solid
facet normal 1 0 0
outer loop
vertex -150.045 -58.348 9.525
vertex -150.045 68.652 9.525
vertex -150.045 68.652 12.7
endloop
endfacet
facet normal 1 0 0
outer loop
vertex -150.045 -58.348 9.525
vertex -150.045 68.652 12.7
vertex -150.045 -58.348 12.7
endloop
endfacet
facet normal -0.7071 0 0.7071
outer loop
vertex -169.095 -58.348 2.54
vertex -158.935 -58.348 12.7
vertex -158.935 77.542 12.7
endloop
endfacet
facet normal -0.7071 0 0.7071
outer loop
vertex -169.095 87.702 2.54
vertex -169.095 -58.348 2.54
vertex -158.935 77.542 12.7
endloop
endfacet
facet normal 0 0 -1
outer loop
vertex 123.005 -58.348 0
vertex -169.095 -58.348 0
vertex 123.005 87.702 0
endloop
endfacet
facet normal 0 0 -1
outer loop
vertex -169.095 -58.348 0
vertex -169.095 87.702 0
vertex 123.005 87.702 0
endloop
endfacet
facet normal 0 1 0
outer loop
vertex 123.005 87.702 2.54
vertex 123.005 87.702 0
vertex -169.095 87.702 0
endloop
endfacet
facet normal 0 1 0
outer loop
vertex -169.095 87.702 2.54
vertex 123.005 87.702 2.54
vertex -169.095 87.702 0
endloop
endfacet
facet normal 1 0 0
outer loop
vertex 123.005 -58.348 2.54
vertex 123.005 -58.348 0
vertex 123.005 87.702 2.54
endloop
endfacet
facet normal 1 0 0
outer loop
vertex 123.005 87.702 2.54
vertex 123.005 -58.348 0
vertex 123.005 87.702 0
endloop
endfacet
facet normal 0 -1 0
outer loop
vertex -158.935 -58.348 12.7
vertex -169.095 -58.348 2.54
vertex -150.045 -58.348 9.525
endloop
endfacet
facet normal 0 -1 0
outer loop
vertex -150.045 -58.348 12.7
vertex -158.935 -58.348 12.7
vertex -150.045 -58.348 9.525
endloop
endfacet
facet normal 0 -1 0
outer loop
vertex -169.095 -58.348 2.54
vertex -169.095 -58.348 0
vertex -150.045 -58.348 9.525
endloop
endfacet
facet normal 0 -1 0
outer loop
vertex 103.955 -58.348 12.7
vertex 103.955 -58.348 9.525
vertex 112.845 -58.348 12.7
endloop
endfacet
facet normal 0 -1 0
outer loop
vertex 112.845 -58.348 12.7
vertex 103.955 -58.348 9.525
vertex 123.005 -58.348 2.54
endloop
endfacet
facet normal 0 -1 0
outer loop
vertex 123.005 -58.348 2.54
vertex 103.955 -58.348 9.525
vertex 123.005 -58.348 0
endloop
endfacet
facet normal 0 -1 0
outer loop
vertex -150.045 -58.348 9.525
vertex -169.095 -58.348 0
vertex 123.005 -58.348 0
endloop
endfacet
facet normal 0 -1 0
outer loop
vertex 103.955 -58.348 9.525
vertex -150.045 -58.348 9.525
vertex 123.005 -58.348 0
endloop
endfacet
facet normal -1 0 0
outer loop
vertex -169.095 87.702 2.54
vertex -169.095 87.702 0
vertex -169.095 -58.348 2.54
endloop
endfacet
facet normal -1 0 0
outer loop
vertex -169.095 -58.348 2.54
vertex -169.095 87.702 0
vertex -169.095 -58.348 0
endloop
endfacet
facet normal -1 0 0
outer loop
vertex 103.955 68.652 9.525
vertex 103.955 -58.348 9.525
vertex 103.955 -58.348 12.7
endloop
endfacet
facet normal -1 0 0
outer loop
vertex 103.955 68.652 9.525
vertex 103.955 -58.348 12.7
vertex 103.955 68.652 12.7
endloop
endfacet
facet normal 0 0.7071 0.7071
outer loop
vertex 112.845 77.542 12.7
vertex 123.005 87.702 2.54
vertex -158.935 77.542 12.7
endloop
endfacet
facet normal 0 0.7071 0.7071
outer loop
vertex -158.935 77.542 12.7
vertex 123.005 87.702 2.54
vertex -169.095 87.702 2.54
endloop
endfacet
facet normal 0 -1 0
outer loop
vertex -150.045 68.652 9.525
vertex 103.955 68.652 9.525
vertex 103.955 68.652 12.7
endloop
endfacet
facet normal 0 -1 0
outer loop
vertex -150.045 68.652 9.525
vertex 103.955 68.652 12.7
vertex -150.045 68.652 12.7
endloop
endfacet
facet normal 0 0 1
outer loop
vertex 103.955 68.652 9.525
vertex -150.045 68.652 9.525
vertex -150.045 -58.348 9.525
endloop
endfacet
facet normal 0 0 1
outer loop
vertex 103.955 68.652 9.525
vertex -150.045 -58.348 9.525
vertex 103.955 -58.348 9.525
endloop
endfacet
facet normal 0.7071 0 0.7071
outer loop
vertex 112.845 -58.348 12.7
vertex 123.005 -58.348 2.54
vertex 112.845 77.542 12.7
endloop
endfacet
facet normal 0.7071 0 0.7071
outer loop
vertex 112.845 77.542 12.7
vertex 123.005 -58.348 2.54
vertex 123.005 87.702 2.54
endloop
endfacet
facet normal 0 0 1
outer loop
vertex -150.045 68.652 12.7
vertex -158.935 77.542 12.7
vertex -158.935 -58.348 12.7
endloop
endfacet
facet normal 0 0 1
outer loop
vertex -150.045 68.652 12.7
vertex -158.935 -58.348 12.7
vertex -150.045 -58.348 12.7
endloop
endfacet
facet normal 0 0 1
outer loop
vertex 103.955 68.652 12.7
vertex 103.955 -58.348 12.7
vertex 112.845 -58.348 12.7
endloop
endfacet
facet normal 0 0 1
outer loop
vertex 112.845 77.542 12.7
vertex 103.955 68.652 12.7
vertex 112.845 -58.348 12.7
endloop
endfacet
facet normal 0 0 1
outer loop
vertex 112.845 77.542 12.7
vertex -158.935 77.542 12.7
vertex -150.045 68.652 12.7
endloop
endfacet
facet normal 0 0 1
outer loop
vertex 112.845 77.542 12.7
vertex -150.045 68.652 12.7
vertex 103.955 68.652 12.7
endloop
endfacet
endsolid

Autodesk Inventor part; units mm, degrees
ref_plane "YZ Plane" through (0, 0, 0) normal (1, 0, 0) x (0, 1, 0)
ref_plane "XZ Plane" through (0, 0, 0) normal (0, 1, 0) x (-1, 0, 0)
ref_plane "XY Plane" through (0, 0, 0) normal (0, 0, 1) x (1, 0, 0)
sketch "Sketch1" plane through (-152.4, -88.9, 0) normal (0, 0, 1) x (1, 0, 0)
  line L0 (2.3554, 30.5524) -> (256.3554, 30.5524)
  line L1 (256.3554, 30.5524) -> (256.3554, 157.5524)
  line L2 (256.3554, 157.5524) -> (2.3554, 157.5524)
  line L3 (2.3554, 157.5524) -> (2.3554, 30.5524)
  line L4 (-16.6946, 30.5524) -> (275.4054, 30.5524)
  line L5 (275.4054, 30.5524) -> (275.4054, 176.6024)
  line L6 (275.4054, 176.6024) -> (-16.6946, 176.6024)
  line L7 (-16.6946, 176.6024) -> (-16.6946, 30.5524)
  point P0 (129.3554, 30.5524)
  point P1 (256.3554, 30.5524)
  point P2 (2.3554, 30.5524)
  dimension "d2" = 254
  dimension "d3" = 127
  dimension "d0" = 19.05
  dimension "d1" = 19.05
extrude "Extrusion1" add sketch "Sketch1" along normal blind 12.7 contours L4 L7 L6 L5 L1 L2 L3
extrude "Extrusion2" add sketch "Sketch1" along normal blind 9.525 contours L3 L2 L1 L0
chamfer "Chamfer1" distance 10.16 angle 45 3 edges at (-169.0946, 14.6774, 12.7) (-23.0446, 87.7024, 12.7) (123.0054, 14.6774, 12.7)
ref_plane "Work Plane1" through (-169.0946, 87.7024, 0) normal (1, 0, 0) x (0, -1, 0)
sketch "Sketch2" plane through (-169.0946, 87.7024, 0) normal (1, 0, 0) x (0, -1, 0)
  line L0 (0, 0) -> (146.05, 0) projected
  point P0 (88.9, 0)
  point P1 (88.9, 0)
  dimension "d17" = 88.9
ref_plane "Work Plane2" through (123.0054, 87.7024, 0) normal (0, -1, 0) x (-1, 0, 0)
equation "\"d1\" = d0"
properties part number "Top Base"
